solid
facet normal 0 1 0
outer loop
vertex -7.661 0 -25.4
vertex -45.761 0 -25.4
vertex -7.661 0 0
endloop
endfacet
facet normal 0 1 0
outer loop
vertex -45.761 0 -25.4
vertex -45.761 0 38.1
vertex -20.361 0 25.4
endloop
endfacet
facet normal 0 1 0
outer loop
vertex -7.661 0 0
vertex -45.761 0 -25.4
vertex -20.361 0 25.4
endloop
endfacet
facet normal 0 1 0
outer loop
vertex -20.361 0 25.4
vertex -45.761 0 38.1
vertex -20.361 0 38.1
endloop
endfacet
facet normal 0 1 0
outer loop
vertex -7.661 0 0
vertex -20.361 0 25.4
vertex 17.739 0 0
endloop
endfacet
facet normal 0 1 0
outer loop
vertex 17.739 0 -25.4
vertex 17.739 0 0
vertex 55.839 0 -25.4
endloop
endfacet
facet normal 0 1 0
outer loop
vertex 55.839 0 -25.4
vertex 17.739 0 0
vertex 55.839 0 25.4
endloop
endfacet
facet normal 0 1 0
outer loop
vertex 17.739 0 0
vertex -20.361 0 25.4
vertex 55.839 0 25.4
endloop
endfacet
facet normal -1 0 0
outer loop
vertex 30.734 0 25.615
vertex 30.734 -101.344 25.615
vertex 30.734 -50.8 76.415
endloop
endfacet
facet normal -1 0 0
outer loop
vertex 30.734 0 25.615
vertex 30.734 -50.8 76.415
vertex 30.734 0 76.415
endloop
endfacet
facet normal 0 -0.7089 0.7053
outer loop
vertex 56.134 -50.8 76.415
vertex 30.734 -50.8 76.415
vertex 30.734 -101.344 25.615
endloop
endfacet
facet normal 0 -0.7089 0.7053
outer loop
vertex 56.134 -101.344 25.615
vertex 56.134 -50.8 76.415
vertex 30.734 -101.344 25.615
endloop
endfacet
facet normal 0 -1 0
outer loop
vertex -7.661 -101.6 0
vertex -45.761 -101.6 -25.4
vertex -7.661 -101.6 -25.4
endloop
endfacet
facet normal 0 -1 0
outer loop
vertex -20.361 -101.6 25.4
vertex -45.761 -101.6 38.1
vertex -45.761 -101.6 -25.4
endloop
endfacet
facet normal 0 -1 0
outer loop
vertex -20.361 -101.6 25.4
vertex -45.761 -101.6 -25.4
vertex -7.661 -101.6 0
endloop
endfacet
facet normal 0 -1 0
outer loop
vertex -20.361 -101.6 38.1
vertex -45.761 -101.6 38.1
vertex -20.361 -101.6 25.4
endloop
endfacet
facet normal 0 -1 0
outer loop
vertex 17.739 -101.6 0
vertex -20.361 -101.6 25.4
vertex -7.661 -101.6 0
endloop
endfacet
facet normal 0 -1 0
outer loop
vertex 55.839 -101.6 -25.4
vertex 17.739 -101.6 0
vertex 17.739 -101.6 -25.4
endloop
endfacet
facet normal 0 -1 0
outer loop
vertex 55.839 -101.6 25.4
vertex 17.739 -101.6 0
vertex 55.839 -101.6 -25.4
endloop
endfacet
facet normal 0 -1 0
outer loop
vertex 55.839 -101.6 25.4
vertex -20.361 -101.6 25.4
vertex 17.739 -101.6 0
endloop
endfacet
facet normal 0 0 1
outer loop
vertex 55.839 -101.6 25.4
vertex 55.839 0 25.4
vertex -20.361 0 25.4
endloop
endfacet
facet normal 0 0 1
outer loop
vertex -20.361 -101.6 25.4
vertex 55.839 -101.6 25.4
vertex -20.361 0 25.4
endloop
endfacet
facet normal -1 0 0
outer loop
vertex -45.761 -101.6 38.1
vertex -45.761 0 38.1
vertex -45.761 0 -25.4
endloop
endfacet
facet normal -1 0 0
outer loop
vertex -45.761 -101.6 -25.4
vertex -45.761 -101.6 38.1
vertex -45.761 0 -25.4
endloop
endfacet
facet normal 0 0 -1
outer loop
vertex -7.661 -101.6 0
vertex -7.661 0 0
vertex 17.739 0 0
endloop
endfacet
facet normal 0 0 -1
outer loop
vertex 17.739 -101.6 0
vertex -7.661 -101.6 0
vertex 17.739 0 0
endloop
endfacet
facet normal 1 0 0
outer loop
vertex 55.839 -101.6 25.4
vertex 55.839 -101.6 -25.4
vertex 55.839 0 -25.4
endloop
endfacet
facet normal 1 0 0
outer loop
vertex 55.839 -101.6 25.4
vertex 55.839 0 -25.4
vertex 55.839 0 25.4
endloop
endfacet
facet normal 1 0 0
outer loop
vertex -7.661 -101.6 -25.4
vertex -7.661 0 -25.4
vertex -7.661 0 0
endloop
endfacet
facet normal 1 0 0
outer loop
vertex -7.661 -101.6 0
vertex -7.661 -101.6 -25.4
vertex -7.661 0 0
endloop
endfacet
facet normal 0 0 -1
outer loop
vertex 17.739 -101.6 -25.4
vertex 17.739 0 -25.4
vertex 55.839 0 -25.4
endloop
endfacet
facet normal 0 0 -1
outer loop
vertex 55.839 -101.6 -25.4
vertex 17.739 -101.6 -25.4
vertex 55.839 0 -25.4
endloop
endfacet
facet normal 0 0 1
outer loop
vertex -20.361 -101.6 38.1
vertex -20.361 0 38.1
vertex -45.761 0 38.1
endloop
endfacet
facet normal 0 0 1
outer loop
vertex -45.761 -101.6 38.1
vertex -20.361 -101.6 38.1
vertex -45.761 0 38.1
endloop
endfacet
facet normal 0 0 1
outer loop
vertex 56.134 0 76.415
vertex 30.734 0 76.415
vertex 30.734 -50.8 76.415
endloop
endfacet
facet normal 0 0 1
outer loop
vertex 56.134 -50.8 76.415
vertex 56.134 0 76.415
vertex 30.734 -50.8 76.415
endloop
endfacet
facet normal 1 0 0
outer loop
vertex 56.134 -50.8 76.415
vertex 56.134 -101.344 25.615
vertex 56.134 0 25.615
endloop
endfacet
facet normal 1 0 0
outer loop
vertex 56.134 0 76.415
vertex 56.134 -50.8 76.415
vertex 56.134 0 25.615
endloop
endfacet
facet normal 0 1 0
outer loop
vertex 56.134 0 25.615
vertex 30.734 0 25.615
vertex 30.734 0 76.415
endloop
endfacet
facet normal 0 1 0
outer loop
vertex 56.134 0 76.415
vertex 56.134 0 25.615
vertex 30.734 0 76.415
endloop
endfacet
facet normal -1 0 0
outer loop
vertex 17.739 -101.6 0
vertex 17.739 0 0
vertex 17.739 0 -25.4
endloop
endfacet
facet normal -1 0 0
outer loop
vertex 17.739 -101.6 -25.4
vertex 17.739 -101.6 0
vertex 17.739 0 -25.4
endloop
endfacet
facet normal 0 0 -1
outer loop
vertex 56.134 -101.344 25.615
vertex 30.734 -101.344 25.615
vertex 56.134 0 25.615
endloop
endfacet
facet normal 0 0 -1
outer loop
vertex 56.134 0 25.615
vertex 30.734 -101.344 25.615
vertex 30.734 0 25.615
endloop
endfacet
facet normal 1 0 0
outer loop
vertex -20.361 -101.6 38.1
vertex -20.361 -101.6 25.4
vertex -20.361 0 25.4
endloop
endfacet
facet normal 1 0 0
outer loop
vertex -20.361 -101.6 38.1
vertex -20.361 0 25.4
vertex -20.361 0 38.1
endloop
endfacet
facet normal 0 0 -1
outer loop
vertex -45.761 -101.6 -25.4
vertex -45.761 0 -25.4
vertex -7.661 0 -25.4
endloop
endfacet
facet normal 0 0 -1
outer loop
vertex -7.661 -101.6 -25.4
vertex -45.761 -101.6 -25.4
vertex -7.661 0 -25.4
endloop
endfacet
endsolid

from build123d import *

# Parameters (mm, degrees)
F1_DEPTH = 101.6
F3_DEPTH = 56.134
F4_DEPTH = 30.734


with BuildPart() as f1:
    # F0 (on Front) → F1 (new body)
    with BuildSketch(Plane.XZ):
        Polygon((17.738884, -25.4), (55.838884, -25.4), (55.838884, 25.4), (-20.361116, 25.4), (-20.361116, 38.1), (-45.761116, 38.1), (-45.761116, -25.4), (-7.661116, -25.4), (-7.661116, 0), (17.738884, 0), align=None)
    extrude(amount=F1_DEPTH)


with BuildPart() as f3:
    # F2 (on Right) → F3 (new body)
    with BuildSketch(Plane.YZ):
        Polygon((-101.344168, 25.614712), (0, 25.614712), (0, 76.414712), (-50.8, 76.414712), align=None)
    extrude(amount=F3_DEPTH)

    # F3_face (on face) → F4 (cut)
    with BuildSketch(Plane(origin=(0, -39.435325, 48.201981), x_dir=(0, 1, 0), z_dir=(-1, 0, 0))):
        Polygon((39.435325, 22.587269), (-61.908843, 22.587269), (-11.364675, -28.212731), (39.435325, -28.212731), align=None)
    extrude(amount=-F4_DEPTH, mode=Mode.SUBTRACT)


solid = Compound([f1.part, f3.part])
